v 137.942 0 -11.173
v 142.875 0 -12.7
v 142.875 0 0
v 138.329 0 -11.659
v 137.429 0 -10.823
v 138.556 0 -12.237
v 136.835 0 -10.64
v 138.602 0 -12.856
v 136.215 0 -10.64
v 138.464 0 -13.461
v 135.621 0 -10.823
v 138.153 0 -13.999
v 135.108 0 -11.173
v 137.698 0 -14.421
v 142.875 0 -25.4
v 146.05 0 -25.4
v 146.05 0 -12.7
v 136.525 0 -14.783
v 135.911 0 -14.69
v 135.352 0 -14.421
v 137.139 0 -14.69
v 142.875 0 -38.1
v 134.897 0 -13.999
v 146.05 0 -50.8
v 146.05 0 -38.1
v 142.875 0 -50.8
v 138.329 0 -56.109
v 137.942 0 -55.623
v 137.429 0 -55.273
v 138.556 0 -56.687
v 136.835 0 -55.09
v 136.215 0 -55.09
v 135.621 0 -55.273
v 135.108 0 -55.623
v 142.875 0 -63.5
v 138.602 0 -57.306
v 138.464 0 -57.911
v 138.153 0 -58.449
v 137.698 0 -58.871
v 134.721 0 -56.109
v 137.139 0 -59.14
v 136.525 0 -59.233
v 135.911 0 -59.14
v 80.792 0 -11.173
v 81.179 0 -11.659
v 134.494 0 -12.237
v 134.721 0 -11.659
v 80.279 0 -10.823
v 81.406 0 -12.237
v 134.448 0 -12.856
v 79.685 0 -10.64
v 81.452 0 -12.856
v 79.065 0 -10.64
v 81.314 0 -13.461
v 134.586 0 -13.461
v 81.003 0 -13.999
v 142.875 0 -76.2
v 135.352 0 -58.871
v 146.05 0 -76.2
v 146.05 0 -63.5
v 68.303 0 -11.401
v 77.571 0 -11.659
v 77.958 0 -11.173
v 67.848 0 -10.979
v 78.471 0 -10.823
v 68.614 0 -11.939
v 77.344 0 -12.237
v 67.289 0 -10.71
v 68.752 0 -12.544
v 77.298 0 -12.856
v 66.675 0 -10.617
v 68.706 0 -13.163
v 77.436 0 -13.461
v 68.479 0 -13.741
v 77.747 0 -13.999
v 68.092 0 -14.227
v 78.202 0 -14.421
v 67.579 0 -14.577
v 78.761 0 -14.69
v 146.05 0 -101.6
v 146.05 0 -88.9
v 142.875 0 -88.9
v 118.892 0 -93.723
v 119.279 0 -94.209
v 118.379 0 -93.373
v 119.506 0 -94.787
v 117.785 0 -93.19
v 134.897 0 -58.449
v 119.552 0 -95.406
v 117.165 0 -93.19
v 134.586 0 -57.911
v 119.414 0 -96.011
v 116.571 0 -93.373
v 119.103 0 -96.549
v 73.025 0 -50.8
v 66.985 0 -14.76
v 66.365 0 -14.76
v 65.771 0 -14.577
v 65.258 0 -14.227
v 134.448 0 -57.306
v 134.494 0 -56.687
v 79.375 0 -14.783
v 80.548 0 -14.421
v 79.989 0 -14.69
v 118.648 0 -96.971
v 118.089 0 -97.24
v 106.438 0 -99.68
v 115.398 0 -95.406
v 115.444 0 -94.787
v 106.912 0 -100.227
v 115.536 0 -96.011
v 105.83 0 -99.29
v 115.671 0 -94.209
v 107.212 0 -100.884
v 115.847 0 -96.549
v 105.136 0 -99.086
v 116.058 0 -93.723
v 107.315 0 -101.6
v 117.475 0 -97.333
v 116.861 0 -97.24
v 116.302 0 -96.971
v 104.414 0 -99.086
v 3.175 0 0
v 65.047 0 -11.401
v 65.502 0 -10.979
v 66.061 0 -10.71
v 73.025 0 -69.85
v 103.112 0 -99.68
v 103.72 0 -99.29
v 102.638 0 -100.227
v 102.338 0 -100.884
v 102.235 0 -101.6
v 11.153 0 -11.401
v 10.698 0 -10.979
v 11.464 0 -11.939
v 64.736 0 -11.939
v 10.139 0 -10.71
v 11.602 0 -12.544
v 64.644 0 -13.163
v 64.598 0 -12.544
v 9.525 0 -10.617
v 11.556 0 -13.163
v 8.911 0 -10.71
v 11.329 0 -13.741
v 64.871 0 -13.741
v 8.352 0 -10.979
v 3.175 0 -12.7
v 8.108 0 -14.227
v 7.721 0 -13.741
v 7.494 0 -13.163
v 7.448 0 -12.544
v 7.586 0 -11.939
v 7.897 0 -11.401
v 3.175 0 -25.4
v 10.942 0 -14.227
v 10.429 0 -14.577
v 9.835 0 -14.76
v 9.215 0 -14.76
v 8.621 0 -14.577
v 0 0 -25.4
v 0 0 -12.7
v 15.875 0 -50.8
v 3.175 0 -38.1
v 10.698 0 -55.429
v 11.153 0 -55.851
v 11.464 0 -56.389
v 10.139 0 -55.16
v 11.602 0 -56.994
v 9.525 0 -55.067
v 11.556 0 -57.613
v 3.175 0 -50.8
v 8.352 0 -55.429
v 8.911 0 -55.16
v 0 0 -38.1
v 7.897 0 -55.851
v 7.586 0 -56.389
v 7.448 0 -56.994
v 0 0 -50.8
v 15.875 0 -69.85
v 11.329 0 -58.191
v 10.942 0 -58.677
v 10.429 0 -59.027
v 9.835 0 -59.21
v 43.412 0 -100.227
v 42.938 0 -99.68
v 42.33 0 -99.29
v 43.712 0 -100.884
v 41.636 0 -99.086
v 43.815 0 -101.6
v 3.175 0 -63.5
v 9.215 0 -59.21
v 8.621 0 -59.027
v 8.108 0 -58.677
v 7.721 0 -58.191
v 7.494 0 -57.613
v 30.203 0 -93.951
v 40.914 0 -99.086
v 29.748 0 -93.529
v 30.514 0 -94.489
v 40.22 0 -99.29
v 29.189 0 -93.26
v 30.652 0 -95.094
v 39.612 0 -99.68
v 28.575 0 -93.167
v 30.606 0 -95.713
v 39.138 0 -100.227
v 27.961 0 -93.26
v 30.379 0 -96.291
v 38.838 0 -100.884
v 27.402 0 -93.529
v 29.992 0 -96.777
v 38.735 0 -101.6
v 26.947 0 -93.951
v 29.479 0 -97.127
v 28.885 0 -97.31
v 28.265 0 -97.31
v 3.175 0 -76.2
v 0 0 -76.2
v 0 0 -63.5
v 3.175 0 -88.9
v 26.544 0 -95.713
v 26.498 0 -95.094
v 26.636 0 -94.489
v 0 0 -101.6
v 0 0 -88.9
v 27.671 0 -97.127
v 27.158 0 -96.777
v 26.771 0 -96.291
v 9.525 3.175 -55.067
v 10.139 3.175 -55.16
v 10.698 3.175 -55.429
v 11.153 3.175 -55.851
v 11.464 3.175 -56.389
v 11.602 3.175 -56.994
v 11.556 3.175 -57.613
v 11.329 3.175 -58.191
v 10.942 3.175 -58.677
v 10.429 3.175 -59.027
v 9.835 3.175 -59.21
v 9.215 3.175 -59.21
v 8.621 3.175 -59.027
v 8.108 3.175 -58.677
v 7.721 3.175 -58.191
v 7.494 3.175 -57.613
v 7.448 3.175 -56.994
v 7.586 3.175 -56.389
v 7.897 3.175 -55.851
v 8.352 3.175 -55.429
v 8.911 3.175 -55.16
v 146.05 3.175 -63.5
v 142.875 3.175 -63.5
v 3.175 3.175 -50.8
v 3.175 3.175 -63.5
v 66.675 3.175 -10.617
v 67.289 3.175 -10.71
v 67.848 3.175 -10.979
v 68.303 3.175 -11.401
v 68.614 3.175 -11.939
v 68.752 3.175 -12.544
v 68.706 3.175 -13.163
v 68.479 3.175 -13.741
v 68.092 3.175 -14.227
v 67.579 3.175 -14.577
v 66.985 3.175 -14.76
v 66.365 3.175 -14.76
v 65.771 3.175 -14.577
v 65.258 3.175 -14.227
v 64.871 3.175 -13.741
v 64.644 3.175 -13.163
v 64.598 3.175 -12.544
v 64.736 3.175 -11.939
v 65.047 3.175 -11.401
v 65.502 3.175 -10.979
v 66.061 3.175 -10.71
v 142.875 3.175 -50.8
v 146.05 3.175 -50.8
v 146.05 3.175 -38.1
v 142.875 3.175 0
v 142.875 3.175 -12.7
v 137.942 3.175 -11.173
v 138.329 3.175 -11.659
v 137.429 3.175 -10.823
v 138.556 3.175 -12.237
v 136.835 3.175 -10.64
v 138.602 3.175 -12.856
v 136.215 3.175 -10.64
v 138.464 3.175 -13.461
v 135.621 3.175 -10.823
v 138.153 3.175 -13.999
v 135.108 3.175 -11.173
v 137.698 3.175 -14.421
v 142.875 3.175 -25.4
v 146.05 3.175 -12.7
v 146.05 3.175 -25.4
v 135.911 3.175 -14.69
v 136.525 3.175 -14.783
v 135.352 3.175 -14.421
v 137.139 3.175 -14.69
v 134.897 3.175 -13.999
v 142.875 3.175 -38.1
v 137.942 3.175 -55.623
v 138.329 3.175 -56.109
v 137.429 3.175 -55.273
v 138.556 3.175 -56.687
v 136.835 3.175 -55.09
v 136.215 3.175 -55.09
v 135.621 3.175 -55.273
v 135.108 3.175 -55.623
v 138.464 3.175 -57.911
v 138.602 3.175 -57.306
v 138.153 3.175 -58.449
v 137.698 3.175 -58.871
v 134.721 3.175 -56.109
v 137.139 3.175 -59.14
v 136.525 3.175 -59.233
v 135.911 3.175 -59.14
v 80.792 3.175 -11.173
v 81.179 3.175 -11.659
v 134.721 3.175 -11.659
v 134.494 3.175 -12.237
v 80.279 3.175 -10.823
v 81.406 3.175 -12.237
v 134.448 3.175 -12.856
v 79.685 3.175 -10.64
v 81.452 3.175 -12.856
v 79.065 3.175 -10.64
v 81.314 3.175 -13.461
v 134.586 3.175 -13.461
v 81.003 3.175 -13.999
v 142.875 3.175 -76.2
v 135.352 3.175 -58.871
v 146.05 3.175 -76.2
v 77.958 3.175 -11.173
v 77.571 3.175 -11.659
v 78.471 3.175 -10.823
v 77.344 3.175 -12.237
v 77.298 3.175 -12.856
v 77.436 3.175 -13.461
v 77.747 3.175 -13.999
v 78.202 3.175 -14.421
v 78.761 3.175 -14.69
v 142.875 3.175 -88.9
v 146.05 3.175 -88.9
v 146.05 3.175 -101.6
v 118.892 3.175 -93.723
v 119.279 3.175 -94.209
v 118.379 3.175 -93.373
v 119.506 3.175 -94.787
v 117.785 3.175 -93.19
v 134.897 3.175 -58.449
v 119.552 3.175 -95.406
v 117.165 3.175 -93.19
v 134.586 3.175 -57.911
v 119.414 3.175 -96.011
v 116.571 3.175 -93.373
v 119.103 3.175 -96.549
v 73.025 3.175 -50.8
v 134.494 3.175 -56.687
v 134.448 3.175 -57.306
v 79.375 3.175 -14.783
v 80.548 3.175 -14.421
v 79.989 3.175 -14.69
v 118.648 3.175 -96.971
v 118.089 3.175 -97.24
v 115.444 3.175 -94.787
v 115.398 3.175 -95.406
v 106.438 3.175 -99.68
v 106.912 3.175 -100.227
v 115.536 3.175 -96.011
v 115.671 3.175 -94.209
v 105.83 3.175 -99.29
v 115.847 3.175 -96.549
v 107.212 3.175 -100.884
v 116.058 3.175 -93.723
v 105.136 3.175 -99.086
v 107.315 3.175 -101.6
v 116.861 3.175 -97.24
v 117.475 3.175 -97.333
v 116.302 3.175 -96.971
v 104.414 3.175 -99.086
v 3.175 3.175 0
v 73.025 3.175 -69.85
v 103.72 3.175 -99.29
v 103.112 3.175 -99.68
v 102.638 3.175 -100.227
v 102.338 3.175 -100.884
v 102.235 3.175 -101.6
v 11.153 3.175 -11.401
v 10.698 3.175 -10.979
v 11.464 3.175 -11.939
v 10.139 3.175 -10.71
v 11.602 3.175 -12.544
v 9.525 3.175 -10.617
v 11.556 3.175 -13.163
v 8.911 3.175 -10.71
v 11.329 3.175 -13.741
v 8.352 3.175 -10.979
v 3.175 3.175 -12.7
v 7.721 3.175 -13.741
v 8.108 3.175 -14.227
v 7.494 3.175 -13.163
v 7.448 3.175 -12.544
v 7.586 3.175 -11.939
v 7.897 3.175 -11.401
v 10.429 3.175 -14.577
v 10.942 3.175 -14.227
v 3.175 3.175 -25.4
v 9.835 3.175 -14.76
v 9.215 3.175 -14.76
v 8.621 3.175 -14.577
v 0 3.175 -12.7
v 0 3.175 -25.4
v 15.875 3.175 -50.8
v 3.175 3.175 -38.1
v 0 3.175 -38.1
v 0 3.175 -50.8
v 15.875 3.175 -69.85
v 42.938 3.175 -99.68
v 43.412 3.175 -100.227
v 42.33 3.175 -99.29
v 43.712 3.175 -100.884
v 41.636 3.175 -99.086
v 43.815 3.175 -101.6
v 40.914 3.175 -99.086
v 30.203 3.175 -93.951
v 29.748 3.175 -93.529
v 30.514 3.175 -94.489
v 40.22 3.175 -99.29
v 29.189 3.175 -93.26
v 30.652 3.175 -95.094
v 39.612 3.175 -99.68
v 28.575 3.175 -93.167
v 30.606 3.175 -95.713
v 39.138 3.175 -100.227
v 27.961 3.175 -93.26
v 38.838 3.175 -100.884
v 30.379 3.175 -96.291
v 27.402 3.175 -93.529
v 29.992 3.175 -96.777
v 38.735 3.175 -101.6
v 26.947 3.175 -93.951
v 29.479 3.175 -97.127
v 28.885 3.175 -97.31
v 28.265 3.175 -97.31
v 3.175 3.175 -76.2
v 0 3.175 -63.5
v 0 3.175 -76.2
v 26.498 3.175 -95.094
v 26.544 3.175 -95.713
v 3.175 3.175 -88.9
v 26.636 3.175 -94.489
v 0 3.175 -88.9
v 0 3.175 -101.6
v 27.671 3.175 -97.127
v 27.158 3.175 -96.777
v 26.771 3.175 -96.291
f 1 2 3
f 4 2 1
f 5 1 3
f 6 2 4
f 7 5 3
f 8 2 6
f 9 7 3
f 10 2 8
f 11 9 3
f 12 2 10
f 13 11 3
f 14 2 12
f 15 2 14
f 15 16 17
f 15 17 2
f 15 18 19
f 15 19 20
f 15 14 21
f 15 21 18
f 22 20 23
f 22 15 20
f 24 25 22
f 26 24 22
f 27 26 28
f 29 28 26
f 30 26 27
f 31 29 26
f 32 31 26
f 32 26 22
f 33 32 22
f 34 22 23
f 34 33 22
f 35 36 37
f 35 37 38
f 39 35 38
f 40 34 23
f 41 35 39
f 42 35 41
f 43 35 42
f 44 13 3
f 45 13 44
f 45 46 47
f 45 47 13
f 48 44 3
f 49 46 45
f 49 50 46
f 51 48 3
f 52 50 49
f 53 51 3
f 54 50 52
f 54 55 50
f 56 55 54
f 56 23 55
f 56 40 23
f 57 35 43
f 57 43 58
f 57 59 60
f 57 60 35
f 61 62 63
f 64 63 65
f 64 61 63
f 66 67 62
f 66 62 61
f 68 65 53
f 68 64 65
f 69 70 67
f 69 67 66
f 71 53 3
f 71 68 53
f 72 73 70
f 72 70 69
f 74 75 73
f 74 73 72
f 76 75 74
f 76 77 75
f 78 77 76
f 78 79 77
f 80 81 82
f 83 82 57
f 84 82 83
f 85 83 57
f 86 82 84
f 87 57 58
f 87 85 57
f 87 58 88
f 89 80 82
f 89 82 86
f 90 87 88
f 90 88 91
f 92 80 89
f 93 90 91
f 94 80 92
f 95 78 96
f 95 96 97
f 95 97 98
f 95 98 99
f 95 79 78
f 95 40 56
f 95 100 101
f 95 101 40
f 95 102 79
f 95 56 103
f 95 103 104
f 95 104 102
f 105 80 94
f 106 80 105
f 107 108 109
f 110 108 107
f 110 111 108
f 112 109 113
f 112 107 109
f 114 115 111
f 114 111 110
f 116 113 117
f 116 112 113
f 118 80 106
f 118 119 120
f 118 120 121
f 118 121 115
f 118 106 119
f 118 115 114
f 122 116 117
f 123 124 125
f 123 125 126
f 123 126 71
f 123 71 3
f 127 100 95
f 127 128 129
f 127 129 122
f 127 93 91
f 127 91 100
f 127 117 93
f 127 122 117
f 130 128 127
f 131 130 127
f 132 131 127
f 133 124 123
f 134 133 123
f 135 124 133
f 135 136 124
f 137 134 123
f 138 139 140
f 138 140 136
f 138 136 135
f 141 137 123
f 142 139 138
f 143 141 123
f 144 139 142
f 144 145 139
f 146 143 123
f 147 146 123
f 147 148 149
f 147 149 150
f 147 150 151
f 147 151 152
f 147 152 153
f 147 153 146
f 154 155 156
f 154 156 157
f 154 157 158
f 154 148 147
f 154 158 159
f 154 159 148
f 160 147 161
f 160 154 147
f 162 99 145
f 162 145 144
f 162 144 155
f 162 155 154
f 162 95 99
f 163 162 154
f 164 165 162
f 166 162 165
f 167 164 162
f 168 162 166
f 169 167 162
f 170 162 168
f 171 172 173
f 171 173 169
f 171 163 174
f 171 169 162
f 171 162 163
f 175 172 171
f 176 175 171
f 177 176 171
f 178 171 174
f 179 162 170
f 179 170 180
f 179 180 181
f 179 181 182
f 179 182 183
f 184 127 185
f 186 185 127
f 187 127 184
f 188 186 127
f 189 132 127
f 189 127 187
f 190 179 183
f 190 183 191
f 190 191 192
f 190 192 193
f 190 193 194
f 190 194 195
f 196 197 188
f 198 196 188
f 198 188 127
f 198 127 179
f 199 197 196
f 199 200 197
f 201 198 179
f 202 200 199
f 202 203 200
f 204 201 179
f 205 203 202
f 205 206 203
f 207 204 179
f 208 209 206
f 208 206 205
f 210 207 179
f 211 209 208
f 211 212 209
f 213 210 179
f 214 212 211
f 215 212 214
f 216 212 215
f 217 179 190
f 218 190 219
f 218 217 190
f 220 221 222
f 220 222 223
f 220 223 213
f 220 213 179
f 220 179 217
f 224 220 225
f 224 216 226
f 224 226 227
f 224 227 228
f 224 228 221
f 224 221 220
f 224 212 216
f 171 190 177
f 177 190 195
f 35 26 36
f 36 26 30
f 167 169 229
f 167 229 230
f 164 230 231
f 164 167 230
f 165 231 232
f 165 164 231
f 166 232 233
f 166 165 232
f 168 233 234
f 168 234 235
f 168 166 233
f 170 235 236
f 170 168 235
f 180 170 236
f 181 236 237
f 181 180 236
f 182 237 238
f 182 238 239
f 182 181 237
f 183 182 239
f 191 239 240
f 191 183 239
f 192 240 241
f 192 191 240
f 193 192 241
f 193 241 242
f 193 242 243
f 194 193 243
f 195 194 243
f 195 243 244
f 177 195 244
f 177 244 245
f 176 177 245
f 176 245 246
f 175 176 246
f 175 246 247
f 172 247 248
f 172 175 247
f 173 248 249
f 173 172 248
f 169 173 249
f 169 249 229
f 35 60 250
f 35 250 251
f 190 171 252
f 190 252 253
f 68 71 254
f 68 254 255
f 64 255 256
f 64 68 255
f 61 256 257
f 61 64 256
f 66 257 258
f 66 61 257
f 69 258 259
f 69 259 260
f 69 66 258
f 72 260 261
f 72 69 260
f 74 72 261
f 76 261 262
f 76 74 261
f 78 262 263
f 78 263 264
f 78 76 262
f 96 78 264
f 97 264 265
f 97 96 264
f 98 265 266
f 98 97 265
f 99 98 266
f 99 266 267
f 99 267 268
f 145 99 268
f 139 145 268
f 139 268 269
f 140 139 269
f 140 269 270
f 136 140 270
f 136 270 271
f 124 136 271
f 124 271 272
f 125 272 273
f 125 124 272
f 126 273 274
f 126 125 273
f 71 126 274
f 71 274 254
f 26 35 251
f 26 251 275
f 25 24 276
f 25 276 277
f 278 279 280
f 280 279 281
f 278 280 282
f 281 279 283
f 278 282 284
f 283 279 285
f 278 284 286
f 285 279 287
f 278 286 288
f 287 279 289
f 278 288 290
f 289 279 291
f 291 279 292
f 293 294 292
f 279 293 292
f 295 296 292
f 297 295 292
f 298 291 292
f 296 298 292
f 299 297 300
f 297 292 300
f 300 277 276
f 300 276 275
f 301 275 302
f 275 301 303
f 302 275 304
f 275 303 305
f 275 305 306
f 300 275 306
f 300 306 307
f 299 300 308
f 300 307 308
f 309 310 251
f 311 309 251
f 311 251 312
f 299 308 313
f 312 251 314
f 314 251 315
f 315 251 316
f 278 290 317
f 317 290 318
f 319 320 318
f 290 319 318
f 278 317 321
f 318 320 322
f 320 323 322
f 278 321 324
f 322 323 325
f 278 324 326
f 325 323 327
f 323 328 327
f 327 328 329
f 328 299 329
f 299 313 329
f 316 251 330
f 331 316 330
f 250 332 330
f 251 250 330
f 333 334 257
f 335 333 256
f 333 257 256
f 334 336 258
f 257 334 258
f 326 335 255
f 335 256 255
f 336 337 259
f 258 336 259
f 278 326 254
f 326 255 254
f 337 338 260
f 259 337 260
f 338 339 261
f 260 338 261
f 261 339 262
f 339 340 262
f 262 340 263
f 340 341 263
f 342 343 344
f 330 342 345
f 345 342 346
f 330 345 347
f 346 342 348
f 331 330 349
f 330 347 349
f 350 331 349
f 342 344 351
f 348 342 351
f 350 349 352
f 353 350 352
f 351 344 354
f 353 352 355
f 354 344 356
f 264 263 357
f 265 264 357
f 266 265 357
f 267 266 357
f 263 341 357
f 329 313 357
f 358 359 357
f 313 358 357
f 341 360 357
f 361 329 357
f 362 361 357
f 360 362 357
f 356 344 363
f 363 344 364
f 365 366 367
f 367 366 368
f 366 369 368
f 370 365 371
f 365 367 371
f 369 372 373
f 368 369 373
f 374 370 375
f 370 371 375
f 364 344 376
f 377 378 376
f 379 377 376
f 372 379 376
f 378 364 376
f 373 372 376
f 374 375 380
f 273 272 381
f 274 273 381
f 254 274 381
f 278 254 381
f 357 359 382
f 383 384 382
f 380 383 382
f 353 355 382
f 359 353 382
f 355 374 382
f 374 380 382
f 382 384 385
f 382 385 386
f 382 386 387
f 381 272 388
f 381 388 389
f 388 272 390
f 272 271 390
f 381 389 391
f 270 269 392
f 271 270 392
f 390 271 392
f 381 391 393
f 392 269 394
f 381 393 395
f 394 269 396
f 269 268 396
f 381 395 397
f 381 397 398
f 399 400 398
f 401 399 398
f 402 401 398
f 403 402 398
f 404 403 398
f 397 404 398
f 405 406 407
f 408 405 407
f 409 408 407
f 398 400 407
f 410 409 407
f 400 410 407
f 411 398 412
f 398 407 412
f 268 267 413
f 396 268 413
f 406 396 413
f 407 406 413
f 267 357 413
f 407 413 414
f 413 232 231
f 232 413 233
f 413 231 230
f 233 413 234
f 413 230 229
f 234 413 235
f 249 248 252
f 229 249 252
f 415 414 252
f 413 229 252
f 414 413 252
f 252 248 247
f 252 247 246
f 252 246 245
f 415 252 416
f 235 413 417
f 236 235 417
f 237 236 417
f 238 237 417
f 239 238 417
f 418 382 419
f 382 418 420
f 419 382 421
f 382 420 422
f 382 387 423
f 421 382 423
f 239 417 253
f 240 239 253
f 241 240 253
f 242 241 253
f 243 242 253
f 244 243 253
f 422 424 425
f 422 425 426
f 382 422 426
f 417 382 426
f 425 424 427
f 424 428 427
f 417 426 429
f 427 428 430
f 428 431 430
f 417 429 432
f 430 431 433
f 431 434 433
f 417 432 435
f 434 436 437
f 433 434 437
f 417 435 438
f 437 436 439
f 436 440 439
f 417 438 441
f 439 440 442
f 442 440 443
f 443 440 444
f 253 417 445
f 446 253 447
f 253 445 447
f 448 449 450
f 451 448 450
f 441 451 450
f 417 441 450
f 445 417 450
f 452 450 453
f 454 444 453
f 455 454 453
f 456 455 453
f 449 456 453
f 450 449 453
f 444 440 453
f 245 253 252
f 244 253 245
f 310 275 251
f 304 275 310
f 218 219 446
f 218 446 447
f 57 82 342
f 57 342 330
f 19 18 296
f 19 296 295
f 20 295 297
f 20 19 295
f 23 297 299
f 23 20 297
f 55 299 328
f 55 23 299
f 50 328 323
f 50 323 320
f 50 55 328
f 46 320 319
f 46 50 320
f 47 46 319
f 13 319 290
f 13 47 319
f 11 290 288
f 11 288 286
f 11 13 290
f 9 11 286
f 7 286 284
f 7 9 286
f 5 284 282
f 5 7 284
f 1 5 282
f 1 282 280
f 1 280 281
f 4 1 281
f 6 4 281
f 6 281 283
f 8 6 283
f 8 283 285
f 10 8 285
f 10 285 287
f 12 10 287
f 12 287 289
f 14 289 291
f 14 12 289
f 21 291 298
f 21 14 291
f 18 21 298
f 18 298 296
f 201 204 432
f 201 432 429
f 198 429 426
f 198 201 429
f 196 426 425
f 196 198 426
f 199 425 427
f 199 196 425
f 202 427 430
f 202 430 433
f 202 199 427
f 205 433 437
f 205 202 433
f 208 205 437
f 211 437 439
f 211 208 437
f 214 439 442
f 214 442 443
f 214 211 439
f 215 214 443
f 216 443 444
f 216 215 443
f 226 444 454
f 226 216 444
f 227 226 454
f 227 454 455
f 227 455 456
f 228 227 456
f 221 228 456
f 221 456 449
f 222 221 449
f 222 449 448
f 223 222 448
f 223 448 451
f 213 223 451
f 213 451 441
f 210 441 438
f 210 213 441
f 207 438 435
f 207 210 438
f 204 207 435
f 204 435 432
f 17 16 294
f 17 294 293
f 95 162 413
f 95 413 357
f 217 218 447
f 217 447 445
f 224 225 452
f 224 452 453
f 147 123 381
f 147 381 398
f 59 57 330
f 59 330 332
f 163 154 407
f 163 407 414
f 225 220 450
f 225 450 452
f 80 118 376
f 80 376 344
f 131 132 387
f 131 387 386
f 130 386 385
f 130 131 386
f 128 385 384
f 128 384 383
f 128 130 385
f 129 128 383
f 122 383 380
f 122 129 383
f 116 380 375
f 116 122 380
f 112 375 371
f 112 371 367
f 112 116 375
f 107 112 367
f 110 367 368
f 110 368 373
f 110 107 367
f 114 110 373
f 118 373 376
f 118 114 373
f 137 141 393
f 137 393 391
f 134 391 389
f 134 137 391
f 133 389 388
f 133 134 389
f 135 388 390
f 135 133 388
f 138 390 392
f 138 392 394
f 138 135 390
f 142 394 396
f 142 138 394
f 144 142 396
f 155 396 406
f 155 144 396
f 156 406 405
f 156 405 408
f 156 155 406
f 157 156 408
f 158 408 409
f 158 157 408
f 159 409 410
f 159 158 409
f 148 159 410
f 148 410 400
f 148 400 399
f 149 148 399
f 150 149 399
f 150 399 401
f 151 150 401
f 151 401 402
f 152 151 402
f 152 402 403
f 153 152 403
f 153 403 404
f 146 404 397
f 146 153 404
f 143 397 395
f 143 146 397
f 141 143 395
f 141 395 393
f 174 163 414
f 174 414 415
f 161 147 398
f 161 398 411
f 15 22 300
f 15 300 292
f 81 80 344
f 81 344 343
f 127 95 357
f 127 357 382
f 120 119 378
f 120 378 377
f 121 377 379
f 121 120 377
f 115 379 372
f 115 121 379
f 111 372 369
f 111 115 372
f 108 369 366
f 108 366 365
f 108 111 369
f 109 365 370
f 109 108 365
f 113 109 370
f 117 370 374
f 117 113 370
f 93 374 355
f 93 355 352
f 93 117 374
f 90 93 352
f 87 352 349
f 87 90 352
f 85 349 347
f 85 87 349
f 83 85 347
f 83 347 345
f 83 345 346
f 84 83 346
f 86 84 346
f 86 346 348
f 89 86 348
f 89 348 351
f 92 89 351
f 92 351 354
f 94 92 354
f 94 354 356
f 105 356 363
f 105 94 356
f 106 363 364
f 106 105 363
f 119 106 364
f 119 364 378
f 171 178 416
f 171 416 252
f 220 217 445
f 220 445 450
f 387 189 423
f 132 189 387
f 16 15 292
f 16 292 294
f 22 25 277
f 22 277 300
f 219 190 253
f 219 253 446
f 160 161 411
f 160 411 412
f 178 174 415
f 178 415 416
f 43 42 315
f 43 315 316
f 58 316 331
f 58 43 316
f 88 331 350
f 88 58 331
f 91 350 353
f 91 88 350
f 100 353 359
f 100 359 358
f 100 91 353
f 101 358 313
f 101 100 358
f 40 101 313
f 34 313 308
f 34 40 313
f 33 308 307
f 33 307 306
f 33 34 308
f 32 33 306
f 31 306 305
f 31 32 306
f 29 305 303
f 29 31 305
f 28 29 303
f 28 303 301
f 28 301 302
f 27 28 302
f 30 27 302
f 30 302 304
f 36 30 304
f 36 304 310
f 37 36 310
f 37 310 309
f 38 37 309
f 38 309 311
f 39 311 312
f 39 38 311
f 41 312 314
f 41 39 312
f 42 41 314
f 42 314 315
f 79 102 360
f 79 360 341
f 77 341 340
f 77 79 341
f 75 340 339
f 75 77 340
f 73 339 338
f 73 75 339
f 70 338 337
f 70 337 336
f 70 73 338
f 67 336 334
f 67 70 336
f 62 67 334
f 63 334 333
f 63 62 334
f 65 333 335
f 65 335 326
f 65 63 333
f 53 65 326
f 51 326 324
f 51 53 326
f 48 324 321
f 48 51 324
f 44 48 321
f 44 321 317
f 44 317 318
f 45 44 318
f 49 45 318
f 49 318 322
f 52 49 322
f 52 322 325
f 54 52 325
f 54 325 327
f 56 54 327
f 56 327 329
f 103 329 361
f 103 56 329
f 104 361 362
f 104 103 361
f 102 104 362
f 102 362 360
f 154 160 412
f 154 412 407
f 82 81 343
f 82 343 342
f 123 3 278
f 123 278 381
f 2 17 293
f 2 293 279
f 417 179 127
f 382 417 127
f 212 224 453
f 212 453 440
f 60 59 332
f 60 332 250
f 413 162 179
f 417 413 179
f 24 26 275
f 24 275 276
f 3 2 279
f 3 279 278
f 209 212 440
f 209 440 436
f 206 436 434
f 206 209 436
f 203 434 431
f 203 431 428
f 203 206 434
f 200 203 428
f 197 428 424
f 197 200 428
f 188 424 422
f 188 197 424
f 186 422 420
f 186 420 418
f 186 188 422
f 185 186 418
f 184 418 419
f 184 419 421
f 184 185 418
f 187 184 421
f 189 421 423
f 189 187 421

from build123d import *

# Parameters (mm, degrees)
SKETCH2_R           = 2.0828
SKETCH2_W           = 57.15
SKETCH2_H           = 19.05
BOSS_EXTRUDE1_DEPTH = 3.175


with BuildPart() as part:
    # Sketch2 → Boss-Extrude1 (new body)
    with BuildSketch(Plane(origin=(0, 0, 0), x_dir=(1, 0, 0), z_dir=(0, 1, 0))):
        with BuildLine():
            Line((3.175, 0), (3.175, 12.7))
            Line((3.175, 12.7), (0, 12.7))
            Line((0, 12.7), (0, 25.4))
            Line((0, 25.4), (3.175, 25.4))
            Line((3.175, 25.4), (3.175, 38.1))
            Line((3.175, 38.1), (0, 38.1))
            Line((0, 38.1), (0, 50.8))
            Line((0, 50.8), (3.175, 50.8))
            Line((3.175, 50.8), (3.175, 63.5))
            Line((3.175, 63.5), (0, 63.5))
            Line((0, 63.5), (0, 76.2))
            Line((0, 76.2), (3.175, 76.2))
            Line((3.175, 76.2), (3.175, 88.9))
            Line((3.175, 88.9), (0, 88.9))
            Line((0, 88.9), (0, 101.6))
            Line((0, 101.6), (3.175, 101.6))
            Line((3.175, 101.6), (38.735, 101.6))
            ThreePointArc((38.735, 101.6), (41.275, 99.06), (43.815, 101.6))
            Line((43.815, 101.6), (102.235, 101.6))
            ThreePointArc((102.235, 101.6), (104.775, 99.06), (107.315, 101.6))
            Line((107.315, 101.6), (142.875, 101.6))
            Line((142.875, 101.6), (146.05, 101.6))
            Line((146.05, 101.6), (146.05, 88.9))
            Line((146.05, 88.9), (142.875, 88.9))
            Line((142.875, 88.9), (142.875, 76.2))
            Line((142.875, 76.2), (146.05, 76.2))
            Line((146.05, 76.2), (146.05, 63.5))
            Line((146.05, 63.5), (142.875, 63.5))
            Line((142.875, 63.5), (142.875, 50.8))
            Line((142.875, 50.8), (146.05, 50.8))
            Line((146.05, 50.8), (146.05, 38.1))
            Line((146.05, 38.1), (142.875, 38.1))
            Line((142.875, 38.1), (142.875, 25.4))
            Line((142.875, 25.4), (146.05, 25.4))
            Line((146.05, 25.4), (146.05, 12.7))
            Line((146.05, 12.7), (142.875, 12.7))
            Line((142.875, 12.7), (142.875, 0))
            Line((142.875, 0), (3.175, 0))
        make_face()
        with Locations(Location((136.525, 57.15, 0), (0, 0, 90))):
            Circle(SKETCH2_R, mode=Mode.SUBTRACT)
        with Locations(Location((9.525, 12.7, 0), (0, 0, 270))):
            Circle(SKETCH2_R, mode=Mode.SUBTRACT)
        with Locations(Location((9.525, 57.15, 0), (0, 0, 270))):
            Circle(SKETCH2_R, mode=Mode.SUBTRACT)
        with Locations(Location((136.525, 12.7, 0), (0, 0, 90))):
            Circle(SKETCH2_R, mode=Mode.SUBTRACT)
        with Locations(Location((28.575, 95.25, 0), (0, 0, 270))):
            Circle(SKETCH2_R, mode=Mode.SUBTRACT)
        with Locations(Location((117.475, 95.25, 0), (0, 0, 90))):
            Circle(SKETCH2_R, mode=Mode.SUBTRACT)
        with Locations(Location((66.675, 12.7, 0), (0, 0, 270))):
            Circle(SKETCH2_R, mode=Mode.SUBTRACT)
        with Locations(Location((79.375, 12.7, 0), (0, 0, 90))):
            Circle(SKETCH2_R, mode=Mode.SUBTRACT)
        with Locations((44.45, 60.325)):
            Rectangle(SKETCH2_W, SKETCH2_H, mode=Mode.SUBTRACT)
    extrude(amount=BOSS_EXTRUDE1_DEPTH)


solid = part.part
